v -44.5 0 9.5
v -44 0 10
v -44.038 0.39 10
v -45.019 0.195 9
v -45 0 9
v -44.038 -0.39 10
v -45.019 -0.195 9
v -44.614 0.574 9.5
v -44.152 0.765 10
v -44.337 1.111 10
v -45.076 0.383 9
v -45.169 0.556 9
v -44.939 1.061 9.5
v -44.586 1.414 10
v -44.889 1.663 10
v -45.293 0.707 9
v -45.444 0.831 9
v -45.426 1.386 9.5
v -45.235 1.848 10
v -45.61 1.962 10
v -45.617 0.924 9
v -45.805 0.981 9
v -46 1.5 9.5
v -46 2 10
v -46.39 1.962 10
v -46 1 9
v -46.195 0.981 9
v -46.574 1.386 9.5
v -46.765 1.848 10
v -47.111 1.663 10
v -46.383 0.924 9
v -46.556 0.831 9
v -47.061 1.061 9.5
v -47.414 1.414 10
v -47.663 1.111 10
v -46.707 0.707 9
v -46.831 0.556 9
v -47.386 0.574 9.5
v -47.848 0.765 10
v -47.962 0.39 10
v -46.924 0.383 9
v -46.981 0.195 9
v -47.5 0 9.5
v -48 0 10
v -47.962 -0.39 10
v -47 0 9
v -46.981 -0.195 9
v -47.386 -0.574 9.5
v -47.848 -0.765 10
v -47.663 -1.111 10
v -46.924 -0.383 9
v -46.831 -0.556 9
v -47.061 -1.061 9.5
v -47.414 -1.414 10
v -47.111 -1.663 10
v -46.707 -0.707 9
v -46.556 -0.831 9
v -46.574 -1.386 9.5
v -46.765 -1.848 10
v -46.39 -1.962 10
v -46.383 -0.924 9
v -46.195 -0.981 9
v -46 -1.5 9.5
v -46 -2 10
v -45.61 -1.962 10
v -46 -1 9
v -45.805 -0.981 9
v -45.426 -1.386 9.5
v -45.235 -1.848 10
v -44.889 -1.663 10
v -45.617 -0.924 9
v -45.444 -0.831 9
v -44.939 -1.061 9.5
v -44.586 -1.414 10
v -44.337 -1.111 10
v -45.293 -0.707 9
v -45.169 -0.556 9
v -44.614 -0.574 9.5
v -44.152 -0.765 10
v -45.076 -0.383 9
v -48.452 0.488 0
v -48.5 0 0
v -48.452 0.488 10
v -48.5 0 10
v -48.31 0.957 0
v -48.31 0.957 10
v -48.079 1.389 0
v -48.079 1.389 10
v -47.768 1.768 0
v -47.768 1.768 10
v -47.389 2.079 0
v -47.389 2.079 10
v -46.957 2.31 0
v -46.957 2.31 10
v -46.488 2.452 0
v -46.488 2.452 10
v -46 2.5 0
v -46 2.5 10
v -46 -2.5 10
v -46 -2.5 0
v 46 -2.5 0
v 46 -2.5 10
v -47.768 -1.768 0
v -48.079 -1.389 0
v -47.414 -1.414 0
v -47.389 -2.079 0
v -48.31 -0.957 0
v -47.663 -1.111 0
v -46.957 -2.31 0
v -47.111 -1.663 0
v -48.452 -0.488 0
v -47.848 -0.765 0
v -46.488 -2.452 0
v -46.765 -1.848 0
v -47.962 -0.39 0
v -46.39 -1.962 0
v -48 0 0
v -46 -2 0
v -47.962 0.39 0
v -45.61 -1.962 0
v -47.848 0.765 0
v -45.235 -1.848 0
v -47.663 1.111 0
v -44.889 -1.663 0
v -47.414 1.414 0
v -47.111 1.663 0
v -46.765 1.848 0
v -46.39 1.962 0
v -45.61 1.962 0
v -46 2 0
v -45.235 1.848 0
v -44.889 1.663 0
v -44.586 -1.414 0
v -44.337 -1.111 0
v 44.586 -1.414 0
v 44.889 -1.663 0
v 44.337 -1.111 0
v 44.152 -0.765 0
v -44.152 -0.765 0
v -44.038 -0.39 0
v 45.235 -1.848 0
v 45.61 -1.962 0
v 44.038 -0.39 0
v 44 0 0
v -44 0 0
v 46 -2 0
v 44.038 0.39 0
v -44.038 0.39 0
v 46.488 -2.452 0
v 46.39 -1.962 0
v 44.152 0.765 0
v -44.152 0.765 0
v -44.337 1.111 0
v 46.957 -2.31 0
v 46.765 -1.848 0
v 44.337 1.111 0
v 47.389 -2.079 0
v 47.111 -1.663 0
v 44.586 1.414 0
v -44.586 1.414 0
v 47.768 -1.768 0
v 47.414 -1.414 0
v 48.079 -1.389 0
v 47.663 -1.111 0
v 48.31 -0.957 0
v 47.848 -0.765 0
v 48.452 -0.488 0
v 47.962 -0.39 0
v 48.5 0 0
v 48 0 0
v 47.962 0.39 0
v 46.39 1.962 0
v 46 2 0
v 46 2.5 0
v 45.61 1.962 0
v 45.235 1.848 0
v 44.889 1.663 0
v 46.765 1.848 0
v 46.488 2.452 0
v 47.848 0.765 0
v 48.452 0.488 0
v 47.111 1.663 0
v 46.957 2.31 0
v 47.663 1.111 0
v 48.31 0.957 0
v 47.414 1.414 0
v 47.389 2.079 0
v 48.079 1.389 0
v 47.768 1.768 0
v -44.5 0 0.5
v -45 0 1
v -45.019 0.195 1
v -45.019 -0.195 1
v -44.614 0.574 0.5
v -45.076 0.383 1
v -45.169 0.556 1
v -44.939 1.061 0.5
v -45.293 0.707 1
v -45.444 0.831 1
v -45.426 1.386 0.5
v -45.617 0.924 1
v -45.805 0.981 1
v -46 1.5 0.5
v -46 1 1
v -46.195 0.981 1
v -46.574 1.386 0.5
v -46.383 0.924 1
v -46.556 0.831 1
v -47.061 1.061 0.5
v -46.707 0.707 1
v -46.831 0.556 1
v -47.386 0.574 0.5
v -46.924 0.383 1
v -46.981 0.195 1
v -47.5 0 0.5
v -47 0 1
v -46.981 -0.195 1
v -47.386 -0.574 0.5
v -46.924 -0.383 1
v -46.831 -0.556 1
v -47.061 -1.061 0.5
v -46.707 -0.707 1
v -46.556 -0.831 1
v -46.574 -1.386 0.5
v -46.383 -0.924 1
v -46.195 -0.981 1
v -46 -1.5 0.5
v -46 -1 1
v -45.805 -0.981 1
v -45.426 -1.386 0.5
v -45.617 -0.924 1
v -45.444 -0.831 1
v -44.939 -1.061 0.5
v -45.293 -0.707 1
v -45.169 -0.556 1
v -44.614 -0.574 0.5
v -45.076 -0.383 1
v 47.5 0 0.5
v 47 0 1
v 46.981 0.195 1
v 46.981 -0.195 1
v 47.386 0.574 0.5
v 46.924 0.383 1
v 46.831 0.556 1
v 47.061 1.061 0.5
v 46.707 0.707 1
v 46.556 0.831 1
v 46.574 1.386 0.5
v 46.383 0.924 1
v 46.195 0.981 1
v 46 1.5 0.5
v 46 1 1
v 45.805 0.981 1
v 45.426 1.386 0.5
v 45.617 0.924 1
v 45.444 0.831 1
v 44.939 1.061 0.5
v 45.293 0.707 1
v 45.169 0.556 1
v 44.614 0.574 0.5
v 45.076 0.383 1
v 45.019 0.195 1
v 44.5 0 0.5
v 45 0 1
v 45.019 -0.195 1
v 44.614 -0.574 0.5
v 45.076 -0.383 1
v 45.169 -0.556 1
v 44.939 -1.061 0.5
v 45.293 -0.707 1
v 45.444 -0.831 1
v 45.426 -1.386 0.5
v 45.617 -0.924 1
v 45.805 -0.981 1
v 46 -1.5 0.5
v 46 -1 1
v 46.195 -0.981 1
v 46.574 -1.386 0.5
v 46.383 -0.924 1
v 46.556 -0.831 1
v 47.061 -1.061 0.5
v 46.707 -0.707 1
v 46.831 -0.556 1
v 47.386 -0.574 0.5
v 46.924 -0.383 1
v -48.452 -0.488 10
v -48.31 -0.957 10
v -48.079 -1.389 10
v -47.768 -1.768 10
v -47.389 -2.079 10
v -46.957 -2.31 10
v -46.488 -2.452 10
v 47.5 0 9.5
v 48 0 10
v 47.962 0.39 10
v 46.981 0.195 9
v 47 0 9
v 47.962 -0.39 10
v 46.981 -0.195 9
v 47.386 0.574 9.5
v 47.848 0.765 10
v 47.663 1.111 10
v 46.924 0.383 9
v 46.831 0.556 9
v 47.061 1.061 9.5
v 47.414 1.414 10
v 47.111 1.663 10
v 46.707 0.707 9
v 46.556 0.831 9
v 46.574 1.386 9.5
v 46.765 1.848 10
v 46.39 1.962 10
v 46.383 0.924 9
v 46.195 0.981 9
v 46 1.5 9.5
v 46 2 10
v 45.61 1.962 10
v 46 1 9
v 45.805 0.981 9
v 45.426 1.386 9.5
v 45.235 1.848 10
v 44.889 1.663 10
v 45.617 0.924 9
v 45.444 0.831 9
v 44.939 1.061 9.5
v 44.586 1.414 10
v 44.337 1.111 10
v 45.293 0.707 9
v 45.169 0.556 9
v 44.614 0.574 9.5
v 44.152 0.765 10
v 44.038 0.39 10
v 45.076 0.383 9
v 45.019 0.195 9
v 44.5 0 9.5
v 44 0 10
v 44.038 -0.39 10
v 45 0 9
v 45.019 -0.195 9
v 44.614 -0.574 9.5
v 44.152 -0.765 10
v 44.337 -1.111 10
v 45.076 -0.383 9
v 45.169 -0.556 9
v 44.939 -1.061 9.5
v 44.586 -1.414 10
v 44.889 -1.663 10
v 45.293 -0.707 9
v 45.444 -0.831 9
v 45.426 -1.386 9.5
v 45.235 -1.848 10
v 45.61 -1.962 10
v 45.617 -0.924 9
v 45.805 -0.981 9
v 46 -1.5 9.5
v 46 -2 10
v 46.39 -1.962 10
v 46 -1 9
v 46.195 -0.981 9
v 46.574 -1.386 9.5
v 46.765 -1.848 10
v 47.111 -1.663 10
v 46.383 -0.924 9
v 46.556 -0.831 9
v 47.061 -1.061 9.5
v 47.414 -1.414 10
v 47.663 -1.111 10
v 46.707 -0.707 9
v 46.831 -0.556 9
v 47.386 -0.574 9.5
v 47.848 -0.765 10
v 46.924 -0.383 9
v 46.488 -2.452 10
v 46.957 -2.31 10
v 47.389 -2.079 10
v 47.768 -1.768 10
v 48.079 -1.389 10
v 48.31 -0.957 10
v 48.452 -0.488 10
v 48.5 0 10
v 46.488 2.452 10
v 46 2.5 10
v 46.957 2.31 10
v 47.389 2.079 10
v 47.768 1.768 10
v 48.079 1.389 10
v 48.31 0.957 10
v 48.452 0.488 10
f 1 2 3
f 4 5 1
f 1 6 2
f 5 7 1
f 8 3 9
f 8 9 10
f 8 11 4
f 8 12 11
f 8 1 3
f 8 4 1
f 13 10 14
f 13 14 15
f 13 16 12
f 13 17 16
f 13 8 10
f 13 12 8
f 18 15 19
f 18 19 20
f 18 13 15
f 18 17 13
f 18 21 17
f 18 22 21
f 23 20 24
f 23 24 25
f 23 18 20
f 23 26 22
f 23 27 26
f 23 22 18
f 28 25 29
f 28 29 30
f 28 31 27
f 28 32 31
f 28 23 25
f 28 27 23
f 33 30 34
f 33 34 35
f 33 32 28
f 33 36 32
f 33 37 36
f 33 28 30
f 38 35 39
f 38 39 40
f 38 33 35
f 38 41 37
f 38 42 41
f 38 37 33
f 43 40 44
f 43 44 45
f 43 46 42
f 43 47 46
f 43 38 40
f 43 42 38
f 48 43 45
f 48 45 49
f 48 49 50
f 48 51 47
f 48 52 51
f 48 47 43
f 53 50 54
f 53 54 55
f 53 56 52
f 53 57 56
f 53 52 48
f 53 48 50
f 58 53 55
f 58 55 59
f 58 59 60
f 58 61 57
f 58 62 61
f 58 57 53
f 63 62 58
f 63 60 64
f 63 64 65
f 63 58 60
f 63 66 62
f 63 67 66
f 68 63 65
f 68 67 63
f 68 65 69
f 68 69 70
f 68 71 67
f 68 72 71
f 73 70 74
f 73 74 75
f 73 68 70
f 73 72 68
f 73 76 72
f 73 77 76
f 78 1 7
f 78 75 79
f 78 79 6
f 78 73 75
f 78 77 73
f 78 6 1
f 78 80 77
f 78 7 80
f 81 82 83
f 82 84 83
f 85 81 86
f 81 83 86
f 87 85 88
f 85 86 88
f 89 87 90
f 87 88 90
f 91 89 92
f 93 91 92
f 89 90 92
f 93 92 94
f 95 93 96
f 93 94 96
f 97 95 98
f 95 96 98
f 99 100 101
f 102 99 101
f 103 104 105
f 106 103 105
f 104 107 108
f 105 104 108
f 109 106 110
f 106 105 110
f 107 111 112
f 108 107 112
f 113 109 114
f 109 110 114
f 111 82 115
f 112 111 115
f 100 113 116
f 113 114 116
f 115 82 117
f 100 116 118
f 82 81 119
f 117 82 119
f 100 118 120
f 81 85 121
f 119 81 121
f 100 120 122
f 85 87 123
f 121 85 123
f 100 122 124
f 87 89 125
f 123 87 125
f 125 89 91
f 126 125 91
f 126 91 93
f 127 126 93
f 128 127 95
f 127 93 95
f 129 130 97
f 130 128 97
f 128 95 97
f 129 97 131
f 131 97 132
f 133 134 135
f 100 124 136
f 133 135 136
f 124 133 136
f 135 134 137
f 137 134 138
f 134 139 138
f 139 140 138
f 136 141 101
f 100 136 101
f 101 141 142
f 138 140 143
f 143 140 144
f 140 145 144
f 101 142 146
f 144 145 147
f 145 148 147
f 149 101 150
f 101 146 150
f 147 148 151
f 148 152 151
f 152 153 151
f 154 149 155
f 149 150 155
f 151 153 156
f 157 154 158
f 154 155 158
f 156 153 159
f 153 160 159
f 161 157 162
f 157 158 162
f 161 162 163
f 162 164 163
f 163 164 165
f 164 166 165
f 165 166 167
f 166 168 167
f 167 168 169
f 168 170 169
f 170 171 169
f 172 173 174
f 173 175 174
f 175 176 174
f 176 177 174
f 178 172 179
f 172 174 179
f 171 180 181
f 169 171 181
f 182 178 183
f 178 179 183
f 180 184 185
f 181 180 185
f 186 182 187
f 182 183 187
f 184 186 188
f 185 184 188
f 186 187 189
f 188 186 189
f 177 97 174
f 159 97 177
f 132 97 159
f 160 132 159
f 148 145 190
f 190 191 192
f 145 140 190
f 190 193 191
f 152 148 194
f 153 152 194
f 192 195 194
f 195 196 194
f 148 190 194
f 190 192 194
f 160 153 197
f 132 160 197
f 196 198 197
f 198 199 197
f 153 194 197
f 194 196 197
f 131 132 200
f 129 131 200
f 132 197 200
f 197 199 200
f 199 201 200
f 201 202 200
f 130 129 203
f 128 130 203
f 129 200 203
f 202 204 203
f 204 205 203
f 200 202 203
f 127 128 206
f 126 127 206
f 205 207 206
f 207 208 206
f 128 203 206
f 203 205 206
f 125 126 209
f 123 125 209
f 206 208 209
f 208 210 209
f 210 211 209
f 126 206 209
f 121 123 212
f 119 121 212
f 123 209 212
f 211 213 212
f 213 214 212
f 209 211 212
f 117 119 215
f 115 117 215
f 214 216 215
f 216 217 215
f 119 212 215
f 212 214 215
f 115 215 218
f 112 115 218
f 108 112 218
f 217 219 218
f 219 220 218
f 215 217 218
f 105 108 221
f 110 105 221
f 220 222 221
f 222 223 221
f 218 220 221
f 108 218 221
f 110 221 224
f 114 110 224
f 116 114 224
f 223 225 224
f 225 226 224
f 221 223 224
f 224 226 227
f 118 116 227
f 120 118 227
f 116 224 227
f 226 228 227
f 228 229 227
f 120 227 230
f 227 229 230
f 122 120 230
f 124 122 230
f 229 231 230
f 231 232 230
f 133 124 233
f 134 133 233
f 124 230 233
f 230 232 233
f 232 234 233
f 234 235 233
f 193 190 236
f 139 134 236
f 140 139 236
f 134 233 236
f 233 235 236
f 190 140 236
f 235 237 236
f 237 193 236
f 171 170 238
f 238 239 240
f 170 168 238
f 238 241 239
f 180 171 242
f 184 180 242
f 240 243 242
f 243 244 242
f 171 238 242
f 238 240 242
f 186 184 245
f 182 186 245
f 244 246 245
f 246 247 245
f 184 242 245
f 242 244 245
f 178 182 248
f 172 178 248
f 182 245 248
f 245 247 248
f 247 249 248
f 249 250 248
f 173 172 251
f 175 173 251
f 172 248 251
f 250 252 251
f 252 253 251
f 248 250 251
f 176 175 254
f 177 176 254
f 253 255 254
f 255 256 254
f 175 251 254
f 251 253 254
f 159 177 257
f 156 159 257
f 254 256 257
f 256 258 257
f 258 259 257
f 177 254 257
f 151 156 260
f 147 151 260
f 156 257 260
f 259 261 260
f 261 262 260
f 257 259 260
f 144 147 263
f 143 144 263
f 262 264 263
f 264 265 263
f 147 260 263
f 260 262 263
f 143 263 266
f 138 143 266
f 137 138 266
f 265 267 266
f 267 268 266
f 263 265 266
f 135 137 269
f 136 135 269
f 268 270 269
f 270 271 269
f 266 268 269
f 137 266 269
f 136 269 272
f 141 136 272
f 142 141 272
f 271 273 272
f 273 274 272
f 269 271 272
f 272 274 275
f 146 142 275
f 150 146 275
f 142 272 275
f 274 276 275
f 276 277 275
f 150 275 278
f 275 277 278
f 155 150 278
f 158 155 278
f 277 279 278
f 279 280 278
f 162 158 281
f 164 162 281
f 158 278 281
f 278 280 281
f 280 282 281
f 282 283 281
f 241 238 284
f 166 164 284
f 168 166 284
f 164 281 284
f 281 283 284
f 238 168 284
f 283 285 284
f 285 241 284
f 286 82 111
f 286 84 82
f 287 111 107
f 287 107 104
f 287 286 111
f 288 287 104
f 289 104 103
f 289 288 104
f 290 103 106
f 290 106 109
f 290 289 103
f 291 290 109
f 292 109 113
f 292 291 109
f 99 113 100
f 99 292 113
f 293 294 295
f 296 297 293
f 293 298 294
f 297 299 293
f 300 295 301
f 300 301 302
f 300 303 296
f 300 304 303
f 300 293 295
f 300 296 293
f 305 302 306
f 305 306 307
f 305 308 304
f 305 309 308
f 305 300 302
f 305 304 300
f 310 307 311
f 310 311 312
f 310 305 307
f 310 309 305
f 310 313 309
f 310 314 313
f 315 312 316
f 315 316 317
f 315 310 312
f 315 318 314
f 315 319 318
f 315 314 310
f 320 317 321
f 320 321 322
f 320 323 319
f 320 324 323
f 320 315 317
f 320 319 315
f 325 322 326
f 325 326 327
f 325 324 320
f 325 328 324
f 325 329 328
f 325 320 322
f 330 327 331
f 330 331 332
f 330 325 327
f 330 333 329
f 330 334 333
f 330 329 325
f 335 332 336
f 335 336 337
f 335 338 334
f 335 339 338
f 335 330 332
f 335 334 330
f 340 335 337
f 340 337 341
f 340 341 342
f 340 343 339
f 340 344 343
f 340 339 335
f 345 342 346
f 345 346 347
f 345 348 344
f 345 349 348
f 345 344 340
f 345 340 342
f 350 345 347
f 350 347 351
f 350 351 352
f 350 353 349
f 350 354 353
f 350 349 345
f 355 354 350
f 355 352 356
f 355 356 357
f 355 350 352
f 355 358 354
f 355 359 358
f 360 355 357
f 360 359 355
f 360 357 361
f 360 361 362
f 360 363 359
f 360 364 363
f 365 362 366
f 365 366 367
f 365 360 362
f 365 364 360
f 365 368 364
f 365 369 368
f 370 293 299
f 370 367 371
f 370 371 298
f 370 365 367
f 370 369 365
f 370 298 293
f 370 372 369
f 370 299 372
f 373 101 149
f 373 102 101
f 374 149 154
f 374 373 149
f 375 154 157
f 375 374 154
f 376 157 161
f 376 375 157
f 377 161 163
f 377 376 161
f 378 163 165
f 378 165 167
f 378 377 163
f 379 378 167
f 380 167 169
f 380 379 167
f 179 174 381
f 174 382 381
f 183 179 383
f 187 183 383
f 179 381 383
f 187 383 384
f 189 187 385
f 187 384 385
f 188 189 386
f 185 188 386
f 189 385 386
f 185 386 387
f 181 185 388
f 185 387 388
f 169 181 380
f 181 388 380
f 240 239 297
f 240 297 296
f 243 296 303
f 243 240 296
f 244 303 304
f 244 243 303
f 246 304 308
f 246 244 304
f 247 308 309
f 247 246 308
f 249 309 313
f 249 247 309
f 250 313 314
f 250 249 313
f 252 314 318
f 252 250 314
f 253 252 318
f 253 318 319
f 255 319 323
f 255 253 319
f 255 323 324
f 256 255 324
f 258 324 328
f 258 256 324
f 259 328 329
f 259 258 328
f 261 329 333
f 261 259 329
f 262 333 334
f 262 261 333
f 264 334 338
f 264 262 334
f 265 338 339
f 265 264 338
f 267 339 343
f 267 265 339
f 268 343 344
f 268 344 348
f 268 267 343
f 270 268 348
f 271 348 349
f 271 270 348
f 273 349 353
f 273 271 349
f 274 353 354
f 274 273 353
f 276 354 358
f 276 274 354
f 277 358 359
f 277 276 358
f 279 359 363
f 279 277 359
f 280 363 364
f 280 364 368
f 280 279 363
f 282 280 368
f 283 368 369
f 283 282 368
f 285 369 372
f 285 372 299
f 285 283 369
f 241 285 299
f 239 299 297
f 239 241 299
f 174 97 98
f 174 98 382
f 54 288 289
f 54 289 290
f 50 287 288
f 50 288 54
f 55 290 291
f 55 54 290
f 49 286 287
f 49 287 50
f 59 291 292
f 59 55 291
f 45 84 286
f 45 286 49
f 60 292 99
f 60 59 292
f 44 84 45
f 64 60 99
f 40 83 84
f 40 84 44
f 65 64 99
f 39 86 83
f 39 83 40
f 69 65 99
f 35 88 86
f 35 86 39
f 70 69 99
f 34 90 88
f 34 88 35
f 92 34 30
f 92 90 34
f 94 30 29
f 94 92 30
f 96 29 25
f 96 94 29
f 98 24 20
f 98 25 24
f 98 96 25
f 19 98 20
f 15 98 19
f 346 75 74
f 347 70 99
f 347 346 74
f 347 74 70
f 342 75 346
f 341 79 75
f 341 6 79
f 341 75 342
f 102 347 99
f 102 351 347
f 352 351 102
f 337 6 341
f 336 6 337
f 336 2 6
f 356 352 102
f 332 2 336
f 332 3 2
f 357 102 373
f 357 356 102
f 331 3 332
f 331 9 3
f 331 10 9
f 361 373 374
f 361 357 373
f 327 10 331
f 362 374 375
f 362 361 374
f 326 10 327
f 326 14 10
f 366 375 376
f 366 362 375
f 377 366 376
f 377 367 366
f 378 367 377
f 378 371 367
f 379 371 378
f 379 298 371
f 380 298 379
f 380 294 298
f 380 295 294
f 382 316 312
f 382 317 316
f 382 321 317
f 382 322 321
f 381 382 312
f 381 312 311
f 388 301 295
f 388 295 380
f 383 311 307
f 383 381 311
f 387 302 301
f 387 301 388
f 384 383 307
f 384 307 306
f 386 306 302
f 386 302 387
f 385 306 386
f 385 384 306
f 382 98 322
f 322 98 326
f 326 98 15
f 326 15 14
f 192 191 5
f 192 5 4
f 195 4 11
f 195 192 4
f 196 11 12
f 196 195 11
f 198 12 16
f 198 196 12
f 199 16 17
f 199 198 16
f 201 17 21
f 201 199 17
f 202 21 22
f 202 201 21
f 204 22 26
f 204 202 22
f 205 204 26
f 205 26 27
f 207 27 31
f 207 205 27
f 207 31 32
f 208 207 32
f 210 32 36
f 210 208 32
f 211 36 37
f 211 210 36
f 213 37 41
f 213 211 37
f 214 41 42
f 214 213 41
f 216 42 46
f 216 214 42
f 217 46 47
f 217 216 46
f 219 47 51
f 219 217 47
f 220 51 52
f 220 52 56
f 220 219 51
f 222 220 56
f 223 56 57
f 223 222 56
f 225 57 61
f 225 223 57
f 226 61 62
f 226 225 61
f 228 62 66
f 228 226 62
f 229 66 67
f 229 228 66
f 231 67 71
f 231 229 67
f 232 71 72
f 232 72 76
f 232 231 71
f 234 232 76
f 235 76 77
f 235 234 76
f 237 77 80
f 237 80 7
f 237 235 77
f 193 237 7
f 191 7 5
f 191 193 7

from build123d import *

# Parameters (mm, degrees)
F0_W     = 97
F0_H     = 5
F0_R     = 1
F1_DEPTH = 10
F2_R     = 2.49999
F3_SIZE  = 1


# Not quite as in the source:
# - a fillet or chamfer is up to 0.001 mm smaller than in the source, because OpenCascade refuses the exact size


with BuildPart() as f1:
    # F0 (on Top) → F1 (new body)
    with BuildSketch(Plane.XY):
        Rectangle(F0_W, F0_H)
        with Locations((-46, 0)):
            Circle(F0_R, mode=Mode.SUBTRACT)
        with Locations((46, 0)):
            Circle(F0_R, mode=Mode.SUBTRACT)
    extrude(amount=F1_DEPTH)

    # F2 (radius 2.5 in the source; OpenCascade refuses exactly that, so slightly less here)
    f2_edges = [f1.edges().sort_by_distance(p)[0] for p in [
        (48.5, 2.5, 5),
        (48.5, -2.5, 5),
        (-48.5, 2.5, 5),
        (-48.5, -2.5, 5),
    ]]
    fillet(f2_edges, radius=F2_R)

    # F3
    f3_edges = [f1.edges().sort_by_distance(p)[0] for p in [
        (-47, 0, 10),
        (45, 0, 10),
        (45, 0, 0),
        (-47, 0, 0),
    ]]
    chamfer(f3_edges, length=F3_SIZE)


solid = f1.part
